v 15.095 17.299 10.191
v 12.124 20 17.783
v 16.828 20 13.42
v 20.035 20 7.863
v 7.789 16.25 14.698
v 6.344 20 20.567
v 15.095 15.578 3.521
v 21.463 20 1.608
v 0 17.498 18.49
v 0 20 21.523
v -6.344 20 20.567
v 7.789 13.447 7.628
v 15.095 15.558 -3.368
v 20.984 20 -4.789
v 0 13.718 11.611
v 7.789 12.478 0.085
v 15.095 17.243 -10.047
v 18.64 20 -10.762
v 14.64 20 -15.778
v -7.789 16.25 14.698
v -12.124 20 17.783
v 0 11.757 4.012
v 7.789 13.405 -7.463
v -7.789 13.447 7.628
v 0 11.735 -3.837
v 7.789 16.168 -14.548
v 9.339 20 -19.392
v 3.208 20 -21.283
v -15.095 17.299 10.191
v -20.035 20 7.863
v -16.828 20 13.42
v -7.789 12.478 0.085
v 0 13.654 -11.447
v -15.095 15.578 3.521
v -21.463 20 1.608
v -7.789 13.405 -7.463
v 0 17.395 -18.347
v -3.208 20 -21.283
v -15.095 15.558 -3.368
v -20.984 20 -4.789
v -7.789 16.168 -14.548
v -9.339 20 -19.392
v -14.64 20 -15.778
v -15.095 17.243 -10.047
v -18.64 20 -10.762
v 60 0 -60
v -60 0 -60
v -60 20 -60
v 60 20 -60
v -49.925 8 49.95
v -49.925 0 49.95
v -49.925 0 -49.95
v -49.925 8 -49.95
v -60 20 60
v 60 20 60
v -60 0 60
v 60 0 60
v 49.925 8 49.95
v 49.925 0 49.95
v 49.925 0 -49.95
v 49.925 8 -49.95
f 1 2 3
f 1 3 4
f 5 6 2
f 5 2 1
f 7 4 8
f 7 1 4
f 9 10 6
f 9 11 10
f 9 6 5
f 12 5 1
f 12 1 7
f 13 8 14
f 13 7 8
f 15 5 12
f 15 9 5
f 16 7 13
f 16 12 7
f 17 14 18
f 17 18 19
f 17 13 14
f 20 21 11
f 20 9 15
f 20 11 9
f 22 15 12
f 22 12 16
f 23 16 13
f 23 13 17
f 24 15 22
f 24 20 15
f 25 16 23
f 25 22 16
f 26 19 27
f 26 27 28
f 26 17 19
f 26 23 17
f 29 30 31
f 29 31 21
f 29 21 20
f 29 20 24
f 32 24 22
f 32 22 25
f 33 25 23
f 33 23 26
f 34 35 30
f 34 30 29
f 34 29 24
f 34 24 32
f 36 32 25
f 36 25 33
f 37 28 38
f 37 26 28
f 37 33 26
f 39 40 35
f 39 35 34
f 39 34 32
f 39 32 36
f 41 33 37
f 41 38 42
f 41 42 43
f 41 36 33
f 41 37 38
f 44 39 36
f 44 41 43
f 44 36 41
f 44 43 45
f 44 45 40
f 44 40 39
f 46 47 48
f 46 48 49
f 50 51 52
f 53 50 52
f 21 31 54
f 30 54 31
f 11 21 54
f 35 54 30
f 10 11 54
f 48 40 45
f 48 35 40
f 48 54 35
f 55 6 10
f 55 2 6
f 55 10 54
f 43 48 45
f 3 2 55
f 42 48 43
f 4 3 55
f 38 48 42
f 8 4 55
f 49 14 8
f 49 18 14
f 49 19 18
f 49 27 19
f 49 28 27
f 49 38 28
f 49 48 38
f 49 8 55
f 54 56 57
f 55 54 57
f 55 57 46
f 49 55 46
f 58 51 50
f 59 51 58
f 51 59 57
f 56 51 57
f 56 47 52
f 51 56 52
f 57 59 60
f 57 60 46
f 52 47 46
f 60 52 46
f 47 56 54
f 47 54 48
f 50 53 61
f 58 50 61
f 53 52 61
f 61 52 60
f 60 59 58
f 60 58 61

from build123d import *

# Parameters (mm, degrees)
SKETCH_2_W          = 120
SKETCH_2_H          = 120
EXTRUDE_1_DEPTH     = 20
SKETCH_4_W          = 99.85
SKETCH_4_H          = 99.9
CUT_EXTRUDE_1_DEPTH = 8


with BuildPart() as part:
    # 草图2 → 凸台-拉伸1 (new body)
    with BuildSketch(Plane(origin=(0, 0, 0), x_dir=(1, 0, 0), z_dir=(0, 1, 0))):
        Rectangle(SKETCH_2_W, SKETCH_2_H)
    extrude(amount=EXTRUDE_1_DEPTH)

    # 草图3 → 切除-旋转4 (revolve, cut)
    with BuildSketch(Plane.XY):
        with BuildLine():
            Line((-31.5, 43), (0, 43))
            Line((0, 43), (31.5, 43))
            ThreePointArc((31.5, 43), (0, 74.5), (-31.5, 43))
        make_face()
    revolve(axis=Axis((-31.5, 43, 0), (1, 0, 0)), mode=Mode.SUBTRACT)

    # 草图4 → 切除-拉伸1 (cut)
    with BuildSketch(Plane(origin=(0, 0, 0), x_dir=(1, 0, 0), z_dir=(0, 1, 0))):
        Rectangle(SKETCH_4_W, SKETCH_4_H)
    extrude(amount=CUT_EXTRUDE_1_DEPTH, mode=Mode.SUBTRACT)


solid = part.part
